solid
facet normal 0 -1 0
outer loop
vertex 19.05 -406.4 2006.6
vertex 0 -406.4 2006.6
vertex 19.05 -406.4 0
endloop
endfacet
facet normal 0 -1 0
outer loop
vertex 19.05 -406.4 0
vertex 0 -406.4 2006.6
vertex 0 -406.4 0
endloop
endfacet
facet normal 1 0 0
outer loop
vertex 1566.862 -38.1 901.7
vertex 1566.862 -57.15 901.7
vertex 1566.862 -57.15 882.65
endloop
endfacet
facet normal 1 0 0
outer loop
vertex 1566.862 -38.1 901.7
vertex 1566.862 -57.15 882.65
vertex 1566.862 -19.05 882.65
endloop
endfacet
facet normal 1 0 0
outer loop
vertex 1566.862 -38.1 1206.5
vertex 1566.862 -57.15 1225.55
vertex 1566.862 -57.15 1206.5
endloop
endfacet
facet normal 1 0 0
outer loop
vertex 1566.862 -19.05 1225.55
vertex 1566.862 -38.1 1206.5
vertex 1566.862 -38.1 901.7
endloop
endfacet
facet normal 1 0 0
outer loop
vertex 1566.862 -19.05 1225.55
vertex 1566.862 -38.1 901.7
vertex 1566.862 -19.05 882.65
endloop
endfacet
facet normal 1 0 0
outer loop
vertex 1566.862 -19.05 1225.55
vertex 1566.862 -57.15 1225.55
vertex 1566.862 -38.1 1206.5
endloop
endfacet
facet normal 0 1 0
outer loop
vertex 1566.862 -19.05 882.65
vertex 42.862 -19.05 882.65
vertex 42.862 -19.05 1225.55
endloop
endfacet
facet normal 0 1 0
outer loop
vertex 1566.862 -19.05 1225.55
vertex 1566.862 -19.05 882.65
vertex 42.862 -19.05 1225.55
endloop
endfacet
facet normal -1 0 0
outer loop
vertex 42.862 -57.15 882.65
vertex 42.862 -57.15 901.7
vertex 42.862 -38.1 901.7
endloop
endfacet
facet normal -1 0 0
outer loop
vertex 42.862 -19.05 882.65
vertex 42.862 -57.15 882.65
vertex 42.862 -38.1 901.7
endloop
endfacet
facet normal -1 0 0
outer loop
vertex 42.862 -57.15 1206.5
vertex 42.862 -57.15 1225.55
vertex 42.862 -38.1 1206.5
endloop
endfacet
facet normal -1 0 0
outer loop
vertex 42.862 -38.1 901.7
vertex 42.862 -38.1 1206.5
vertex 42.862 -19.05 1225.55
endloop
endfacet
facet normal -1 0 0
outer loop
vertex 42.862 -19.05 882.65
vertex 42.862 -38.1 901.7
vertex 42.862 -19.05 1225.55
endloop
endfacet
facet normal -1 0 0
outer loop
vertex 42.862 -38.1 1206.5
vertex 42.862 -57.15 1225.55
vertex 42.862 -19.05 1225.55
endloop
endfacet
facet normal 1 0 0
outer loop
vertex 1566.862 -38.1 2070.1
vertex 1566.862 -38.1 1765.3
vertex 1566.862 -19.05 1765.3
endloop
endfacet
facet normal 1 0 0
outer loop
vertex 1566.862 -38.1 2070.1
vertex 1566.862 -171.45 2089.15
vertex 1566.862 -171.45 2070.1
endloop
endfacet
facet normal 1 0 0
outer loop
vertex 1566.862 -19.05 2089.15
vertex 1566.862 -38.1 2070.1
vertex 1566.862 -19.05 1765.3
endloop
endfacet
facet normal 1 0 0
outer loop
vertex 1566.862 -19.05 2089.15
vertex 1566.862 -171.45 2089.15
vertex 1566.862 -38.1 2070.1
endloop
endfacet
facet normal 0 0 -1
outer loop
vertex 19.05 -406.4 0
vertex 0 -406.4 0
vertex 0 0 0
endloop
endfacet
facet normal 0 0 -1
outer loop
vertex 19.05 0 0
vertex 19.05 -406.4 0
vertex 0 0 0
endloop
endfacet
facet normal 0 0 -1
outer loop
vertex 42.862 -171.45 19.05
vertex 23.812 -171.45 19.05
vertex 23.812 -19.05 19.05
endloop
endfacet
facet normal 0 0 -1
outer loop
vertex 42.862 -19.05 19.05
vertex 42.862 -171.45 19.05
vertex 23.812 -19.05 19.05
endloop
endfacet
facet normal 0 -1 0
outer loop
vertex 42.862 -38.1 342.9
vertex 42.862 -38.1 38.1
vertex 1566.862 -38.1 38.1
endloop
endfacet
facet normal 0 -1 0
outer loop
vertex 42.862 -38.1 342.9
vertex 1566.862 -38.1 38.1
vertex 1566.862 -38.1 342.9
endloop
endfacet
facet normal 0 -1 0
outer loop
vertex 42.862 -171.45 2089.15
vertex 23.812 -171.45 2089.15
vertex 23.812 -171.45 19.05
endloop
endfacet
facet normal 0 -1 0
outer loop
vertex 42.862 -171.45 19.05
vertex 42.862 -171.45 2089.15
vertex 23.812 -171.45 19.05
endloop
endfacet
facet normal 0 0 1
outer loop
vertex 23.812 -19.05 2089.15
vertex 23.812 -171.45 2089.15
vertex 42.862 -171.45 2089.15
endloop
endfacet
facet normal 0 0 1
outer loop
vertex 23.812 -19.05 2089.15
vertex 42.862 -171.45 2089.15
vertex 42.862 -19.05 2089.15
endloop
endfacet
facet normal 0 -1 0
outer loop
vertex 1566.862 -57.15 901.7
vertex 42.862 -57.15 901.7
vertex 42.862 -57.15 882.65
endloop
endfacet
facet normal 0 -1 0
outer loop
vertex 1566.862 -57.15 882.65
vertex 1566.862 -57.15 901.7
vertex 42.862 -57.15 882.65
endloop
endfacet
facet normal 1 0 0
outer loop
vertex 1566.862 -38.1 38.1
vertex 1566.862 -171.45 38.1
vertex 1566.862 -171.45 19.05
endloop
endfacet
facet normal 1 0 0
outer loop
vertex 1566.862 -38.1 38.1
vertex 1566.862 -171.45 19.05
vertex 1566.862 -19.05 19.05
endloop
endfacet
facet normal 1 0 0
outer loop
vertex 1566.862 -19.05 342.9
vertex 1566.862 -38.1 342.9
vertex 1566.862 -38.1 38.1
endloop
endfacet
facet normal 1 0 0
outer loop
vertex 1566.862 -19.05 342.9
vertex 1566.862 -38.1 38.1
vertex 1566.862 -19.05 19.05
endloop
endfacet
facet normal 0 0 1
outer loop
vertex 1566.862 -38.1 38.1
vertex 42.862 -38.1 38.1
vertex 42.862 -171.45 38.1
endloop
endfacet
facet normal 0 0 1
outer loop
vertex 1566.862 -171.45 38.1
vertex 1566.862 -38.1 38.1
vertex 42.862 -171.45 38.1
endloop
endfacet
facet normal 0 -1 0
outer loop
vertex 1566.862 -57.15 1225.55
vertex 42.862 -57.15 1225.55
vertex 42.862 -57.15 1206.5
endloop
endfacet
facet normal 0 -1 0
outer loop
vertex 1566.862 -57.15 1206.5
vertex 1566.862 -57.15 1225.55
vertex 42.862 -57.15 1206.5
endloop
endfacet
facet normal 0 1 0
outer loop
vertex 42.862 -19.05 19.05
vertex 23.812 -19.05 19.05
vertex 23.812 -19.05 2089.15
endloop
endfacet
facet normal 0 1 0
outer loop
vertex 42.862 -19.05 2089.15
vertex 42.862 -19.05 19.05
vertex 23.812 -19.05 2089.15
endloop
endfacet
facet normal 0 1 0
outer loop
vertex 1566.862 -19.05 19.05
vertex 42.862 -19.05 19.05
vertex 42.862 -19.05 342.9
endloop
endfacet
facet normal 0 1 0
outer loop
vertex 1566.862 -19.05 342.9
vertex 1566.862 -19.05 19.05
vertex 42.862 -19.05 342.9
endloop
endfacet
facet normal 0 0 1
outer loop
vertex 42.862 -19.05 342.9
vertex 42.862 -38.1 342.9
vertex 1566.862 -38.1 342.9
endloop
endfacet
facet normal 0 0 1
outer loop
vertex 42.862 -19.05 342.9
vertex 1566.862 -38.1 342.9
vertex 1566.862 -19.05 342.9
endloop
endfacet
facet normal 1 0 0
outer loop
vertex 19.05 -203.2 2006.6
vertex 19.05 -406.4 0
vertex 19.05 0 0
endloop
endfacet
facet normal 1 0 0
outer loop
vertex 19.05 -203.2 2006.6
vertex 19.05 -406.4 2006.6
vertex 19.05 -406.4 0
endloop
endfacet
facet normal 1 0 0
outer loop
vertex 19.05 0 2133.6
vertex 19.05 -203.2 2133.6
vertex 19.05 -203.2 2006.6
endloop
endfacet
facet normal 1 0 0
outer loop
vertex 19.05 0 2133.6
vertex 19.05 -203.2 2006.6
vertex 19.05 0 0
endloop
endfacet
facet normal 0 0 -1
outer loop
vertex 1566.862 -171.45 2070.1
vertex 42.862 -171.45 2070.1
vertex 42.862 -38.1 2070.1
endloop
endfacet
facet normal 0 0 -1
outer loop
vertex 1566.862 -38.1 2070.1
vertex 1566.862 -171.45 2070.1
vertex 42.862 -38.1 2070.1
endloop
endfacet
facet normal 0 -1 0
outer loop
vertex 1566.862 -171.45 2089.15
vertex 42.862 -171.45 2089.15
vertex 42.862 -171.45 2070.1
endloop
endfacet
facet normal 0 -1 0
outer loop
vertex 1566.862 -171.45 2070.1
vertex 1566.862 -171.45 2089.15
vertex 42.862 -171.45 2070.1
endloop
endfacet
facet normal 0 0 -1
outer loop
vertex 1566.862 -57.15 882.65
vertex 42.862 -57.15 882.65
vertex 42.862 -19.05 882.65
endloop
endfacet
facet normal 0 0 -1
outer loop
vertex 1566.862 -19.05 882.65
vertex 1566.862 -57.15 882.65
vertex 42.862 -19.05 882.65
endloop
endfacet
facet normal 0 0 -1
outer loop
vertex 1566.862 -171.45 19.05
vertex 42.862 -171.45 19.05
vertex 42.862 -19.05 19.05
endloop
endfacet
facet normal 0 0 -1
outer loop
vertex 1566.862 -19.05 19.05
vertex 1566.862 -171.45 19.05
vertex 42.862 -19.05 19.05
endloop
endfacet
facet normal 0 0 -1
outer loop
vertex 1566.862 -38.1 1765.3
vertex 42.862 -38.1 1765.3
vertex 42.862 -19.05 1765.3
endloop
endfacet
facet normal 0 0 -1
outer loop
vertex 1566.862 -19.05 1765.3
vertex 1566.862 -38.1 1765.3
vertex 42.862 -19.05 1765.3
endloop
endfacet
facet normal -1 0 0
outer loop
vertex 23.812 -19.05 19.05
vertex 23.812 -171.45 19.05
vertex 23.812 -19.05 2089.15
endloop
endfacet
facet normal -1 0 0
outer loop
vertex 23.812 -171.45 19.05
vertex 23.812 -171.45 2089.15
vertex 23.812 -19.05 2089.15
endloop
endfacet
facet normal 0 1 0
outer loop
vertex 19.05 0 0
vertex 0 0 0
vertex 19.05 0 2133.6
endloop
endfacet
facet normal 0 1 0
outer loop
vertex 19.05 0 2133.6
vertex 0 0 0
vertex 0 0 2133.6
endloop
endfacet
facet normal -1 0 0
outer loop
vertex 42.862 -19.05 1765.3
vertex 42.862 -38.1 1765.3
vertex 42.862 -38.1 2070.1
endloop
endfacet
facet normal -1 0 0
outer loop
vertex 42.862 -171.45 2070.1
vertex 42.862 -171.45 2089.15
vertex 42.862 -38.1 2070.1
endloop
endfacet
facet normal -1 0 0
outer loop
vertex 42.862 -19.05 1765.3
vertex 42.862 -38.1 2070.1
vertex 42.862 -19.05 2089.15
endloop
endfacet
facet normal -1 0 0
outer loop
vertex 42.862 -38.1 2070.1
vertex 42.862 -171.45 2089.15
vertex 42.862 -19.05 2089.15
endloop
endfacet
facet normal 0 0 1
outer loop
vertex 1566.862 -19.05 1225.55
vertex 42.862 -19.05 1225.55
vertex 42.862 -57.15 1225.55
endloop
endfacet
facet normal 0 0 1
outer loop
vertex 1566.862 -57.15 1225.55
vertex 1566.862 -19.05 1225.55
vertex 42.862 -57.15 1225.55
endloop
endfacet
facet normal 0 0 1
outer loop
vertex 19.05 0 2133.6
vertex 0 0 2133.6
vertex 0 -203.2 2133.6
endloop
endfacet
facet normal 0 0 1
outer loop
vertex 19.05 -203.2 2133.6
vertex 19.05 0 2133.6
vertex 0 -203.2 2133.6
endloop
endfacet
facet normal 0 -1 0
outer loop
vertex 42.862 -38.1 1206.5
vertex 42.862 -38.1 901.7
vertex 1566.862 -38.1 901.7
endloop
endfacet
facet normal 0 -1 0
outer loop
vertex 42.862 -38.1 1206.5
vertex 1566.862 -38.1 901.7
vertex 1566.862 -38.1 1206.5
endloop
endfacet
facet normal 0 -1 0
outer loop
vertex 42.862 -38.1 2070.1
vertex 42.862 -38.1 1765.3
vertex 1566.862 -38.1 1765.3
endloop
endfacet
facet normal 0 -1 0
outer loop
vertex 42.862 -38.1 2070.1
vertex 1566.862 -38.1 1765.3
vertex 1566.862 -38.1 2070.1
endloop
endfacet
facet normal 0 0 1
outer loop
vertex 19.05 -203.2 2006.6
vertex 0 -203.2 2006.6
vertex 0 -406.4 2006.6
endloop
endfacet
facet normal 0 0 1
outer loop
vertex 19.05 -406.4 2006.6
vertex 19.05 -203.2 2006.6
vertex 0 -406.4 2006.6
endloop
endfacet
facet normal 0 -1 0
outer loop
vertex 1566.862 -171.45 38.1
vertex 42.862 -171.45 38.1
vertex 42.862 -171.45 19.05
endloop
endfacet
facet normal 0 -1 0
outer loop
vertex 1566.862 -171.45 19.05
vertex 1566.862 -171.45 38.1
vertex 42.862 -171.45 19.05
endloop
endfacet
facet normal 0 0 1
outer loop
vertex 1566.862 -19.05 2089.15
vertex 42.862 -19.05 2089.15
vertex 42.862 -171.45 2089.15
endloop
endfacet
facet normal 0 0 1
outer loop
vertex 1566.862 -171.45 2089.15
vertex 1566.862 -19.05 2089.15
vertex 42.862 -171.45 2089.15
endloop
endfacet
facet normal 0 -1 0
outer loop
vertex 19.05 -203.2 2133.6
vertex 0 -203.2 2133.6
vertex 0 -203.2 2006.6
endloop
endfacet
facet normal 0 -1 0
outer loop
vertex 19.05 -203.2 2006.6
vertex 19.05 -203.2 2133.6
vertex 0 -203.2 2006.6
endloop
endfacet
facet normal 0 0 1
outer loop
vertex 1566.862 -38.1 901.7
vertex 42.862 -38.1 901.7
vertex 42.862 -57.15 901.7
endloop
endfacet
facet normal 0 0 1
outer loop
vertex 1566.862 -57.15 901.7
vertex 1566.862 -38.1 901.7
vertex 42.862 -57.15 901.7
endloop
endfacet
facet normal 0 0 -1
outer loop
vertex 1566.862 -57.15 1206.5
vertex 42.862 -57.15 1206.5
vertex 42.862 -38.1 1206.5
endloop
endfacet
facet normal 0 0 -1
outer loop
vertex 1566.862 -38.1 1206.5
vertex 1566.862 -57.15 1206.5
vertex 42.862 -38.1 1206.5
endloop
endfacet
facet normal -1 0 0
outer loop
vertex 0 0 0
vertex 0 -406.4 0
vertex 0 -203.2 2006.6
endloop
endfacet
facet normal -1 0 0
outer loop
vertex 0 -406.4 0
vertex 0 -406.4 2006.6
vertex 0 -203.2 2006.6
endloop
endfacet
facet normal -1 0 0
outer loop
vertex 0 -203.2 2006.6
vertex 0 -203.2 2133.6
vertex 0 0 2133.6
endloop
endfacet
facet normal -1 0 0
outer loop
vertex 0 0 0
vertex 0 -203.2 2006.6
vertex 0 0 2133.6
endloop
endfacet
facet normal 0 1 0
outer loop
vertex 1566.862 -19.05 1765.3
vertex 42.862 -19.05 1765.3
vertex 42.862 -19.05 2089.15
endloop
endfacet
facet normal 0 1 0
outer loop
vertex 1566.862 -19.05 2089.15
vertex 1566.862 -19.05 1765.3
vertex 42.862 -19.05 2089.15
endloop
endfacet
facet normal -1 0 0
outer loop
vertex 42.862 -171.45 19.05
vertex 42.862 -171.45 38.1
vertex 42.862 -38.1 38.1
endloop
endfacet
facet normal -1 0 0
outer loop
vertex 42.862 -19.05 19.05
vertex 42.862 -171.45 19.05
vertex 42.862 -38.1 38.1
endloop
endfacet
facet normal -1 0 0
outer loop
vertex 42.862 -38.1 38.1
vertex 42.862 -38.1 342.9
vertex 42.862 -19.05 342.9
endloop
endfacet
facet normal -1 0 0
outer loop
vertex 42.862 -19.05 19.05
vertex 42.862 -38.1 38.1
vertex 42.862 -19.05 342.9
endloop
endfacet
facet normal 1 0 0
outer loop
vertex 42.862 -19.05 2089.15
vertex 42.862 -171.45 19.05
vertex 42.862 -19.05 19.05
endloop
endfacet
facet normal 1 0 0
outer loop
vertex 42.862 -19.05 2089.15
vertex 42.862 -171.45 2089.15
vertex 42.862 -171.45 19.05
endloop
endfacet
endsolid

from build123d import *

# Parameters (mm, degrees)
F1_DEPTH = 19.05
F3_W     = 152.4
F3_H     = 19.05
F3_H_2   = 2032
F4_DEPTH = 19.05
F5_W     = 19.05
F5_H     = 304.8
F6_DEPTH = 1524


# Not quite as in the source:
# - a length typed as a fraction of an inch, garbled in the dataset ("3 / 203.2 mm" for 3/8 in), is restored
# - the program builds the solid bodies; features that only make, move or delete a surface that nothing else refers to are left out


with BuildPart() as f1:
    # F0 (on Right) → F1 (new body)
    with BuildSketch(Plane.YZ):
        Polygon((-406.4, 0), (0, 0), (0, 2133.6), (-203.2, 2133.6), (-203.2, 2006.6), (-406.4, 2006.6), align=None)
    extrude(amount=F1_DEPTH)


with BuildPart() as f4:
    # F3 (on offset) → F4 (new body)
    with BuildSketch(Plane.YZ.offset(23.8125)):
        with Locations((-95.25, 28.575)):
            Rectangle(F3_W, F3_H)
        with Locations((-95.25, 1054.1)):
            Rectangle(F3_W, F3_H_2)
        with Locations((-95.25, 2079.625)):
            Rectangle(F3_W, F3_H)
    extrude(amount=F4_DEPTH)


with BuildPart() as f6:
    # F5 (on face) → F6 (new body)
    with BuildSketch(Plane.YZ.offset(42.8625)):
        with Locations((-28.575, 1917.7)):
            Rectangle(F5_W, F5_H)
        Polygon((-38.1, 2070.1), (-19.05, 2070.1), (-19.05, 2089.15), (-171.45, 2089.15), (-171.45, 2070.1), align=None)
    extrude(amount=F6_DEPTH)


with BuildPart() as f6b:
    # F5 (on face) → F6, piece 2 (new body)
    with BuildSketch(Plane.YZ.offset(42.8625)):
        Polygon((-19.05, 19.05), (-19.05, 38.1), (-38.1, 38.1), (-171.45, 38.1), (-171.45, 19.05), align=None)
        with Locations((-28.575, 190.5)):
            Rectangle(F5_W, F5_H)
    extrude(amount=F6_DEPTH)


with BuildPart() as f6c:
    # F5 (on face) → F6, piece 3 (new body)
    with BuildSketch(Plane.YZ.offset(42.8625)):
        with Locations((-28.575, 1054.1)):
            Rectangle(F5_W, F5_H)
        Polygon((-38.1, 1206.5), (-19.05, 1206.5), (-19.05, 1225.55), (-57.15, 1225.55), (-57.15, 1206.5), align=None)
        Polygon((-19.05, 882.65), (-19.05, 901.7), (-38.1, 901.7), (-57.15, 901.7), (-57.15, 882.65), align=None)
    extrude(amount=F6_DEPTH)


solid = Compound([f1.part, f4.part, f6.part, f6b.part, f6c.part])
